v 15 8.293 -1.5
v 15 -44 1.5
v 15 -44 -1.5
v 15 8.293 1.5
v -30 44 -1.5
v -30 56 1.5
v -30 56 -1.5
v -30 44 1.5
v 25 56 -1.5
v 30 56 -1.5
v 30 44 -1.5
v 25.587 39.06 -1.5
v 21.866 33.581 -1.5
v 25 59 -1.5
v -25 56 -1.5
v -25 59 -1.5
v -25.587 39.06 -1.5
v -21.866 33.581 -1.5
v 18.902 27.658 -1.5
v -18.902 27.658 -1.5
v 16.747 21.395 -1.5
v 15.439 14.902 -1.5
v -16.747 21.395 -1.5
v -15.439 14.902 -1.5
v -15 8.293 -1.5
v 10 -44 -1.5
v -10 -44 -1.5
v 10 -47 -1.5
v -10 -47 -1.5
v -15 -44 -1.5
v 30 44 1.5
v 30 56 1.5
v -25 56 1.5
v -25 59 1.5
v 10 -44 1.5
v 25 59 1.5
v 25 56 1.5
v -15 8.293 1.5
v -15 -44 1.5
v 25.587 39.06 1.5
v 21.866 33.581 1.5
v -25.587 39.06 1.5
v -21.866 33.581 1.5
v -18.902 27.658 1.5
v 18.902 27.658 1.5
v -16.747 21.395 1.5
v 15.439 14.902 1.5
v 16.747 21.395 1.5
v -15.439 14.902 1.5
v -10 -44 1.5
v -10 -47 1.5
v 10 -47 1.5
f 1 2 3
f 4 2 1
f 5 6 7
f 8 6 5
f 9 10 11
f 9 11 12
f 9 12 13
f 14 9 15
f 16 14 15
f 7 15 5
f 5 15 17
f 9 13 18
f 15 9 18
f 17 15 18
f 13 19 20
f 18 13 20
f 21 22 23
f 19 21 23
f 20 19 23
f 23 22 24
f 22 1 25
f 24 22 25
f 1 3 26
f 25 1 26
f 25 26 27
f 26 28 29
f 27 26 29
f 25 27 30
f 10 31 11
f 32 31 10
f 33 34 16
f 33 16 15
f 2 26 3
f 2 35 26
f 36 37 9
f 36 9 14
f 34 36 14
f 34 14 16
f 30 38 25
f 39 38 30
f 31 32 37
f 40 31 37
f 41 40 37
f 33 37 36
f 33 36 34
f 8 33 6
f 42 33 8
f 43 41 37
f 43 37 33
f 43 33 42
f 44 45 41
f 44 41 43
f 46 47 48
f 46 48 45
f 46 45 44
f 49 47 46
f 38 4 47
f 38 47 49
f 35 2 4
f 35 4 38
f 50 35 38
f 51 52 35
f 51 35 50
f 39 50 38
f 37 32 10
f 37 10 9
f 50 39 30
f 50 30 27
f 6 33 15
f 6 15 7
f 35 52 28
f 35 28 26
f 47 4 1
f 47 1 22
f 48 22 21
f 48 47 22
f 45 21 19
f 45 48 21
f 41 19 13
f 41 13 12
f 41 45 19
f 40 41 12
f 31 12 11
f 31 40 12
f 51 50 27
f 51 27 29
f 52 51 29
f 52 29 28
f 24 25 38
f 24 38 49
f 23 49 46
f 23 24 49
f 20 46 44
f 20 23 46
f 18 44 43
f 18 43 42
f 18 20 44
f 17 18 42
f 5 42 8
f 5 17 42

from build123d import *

# Parameters (mm, degrees)
BOSS_EXTRUDE1_DEPTH = 1.5
FILLET1_R           = 50


with BuildPart() as part:
    # Sketch2 → Boss-Extrude1 (new, symmetric)
    with BuildSketch(Plane.XY):
        Polygon((15, 44), (30, 44), (30, 56), (25, 56), (25, 59), (-25, 59), (-25, 56), (-30, 56), (-30, 44), (-15, 44), (-15, -44), (-10, -44), (-10, -47), (10, -47), (10, -44), (15, -44), align=None)
    extrude(amount=BOSS_EXTRUDE1_DEPTH, both=True)

    # Fillet1
    # the kernel refuses this fillet: 50 mm, written as the material it adds along each edge
    with BuildSketch(Plane(origin=(-15, 44, -1.5), x_dir=(0, -1, 0), z_dir=(0, 0, 1))) as fillet1_piece_1:
        with BuildLine():
            CenterArc((35.707142143, -50), FILLET1_R, 90, 45.572995999)
            Line((0, -15), (-0.714142843, -14.3))
            ThreePointArc((-0.714142843, -14.3), (-1, -7.5), (-1, 0))
            Line((-1, 0), (0, 1))
            Line((0, 1), (35.707142143, 1))
            Line((35.707142143, 1), (35.707142143, 0))
        make_face()
    extrude(amount=3)
    with BuildSketch(Plane(origin=(15, 44, 1.5), x_dir=(1, 0, 0), z_dir=(0, 0, -1))) as fillet1_piece_2:
        with BuildLine():
            CenterArc((50, 35.707142143), FILLET1_R, 180, 45.572995999)
            Line((0, 35.707142143), (-1, 35.707142143))
            Line((-1, 35.707142143), (-1, 0))
            Line((-1, 0), (0, -1))
            ThreePointArc((0, -1), (7.5, -1), (14.3, -0.714142843))
            Line((14.3, -0.714142843), (15, 0))
        make_face()
    extrude(amount=3)


solid = part.part
